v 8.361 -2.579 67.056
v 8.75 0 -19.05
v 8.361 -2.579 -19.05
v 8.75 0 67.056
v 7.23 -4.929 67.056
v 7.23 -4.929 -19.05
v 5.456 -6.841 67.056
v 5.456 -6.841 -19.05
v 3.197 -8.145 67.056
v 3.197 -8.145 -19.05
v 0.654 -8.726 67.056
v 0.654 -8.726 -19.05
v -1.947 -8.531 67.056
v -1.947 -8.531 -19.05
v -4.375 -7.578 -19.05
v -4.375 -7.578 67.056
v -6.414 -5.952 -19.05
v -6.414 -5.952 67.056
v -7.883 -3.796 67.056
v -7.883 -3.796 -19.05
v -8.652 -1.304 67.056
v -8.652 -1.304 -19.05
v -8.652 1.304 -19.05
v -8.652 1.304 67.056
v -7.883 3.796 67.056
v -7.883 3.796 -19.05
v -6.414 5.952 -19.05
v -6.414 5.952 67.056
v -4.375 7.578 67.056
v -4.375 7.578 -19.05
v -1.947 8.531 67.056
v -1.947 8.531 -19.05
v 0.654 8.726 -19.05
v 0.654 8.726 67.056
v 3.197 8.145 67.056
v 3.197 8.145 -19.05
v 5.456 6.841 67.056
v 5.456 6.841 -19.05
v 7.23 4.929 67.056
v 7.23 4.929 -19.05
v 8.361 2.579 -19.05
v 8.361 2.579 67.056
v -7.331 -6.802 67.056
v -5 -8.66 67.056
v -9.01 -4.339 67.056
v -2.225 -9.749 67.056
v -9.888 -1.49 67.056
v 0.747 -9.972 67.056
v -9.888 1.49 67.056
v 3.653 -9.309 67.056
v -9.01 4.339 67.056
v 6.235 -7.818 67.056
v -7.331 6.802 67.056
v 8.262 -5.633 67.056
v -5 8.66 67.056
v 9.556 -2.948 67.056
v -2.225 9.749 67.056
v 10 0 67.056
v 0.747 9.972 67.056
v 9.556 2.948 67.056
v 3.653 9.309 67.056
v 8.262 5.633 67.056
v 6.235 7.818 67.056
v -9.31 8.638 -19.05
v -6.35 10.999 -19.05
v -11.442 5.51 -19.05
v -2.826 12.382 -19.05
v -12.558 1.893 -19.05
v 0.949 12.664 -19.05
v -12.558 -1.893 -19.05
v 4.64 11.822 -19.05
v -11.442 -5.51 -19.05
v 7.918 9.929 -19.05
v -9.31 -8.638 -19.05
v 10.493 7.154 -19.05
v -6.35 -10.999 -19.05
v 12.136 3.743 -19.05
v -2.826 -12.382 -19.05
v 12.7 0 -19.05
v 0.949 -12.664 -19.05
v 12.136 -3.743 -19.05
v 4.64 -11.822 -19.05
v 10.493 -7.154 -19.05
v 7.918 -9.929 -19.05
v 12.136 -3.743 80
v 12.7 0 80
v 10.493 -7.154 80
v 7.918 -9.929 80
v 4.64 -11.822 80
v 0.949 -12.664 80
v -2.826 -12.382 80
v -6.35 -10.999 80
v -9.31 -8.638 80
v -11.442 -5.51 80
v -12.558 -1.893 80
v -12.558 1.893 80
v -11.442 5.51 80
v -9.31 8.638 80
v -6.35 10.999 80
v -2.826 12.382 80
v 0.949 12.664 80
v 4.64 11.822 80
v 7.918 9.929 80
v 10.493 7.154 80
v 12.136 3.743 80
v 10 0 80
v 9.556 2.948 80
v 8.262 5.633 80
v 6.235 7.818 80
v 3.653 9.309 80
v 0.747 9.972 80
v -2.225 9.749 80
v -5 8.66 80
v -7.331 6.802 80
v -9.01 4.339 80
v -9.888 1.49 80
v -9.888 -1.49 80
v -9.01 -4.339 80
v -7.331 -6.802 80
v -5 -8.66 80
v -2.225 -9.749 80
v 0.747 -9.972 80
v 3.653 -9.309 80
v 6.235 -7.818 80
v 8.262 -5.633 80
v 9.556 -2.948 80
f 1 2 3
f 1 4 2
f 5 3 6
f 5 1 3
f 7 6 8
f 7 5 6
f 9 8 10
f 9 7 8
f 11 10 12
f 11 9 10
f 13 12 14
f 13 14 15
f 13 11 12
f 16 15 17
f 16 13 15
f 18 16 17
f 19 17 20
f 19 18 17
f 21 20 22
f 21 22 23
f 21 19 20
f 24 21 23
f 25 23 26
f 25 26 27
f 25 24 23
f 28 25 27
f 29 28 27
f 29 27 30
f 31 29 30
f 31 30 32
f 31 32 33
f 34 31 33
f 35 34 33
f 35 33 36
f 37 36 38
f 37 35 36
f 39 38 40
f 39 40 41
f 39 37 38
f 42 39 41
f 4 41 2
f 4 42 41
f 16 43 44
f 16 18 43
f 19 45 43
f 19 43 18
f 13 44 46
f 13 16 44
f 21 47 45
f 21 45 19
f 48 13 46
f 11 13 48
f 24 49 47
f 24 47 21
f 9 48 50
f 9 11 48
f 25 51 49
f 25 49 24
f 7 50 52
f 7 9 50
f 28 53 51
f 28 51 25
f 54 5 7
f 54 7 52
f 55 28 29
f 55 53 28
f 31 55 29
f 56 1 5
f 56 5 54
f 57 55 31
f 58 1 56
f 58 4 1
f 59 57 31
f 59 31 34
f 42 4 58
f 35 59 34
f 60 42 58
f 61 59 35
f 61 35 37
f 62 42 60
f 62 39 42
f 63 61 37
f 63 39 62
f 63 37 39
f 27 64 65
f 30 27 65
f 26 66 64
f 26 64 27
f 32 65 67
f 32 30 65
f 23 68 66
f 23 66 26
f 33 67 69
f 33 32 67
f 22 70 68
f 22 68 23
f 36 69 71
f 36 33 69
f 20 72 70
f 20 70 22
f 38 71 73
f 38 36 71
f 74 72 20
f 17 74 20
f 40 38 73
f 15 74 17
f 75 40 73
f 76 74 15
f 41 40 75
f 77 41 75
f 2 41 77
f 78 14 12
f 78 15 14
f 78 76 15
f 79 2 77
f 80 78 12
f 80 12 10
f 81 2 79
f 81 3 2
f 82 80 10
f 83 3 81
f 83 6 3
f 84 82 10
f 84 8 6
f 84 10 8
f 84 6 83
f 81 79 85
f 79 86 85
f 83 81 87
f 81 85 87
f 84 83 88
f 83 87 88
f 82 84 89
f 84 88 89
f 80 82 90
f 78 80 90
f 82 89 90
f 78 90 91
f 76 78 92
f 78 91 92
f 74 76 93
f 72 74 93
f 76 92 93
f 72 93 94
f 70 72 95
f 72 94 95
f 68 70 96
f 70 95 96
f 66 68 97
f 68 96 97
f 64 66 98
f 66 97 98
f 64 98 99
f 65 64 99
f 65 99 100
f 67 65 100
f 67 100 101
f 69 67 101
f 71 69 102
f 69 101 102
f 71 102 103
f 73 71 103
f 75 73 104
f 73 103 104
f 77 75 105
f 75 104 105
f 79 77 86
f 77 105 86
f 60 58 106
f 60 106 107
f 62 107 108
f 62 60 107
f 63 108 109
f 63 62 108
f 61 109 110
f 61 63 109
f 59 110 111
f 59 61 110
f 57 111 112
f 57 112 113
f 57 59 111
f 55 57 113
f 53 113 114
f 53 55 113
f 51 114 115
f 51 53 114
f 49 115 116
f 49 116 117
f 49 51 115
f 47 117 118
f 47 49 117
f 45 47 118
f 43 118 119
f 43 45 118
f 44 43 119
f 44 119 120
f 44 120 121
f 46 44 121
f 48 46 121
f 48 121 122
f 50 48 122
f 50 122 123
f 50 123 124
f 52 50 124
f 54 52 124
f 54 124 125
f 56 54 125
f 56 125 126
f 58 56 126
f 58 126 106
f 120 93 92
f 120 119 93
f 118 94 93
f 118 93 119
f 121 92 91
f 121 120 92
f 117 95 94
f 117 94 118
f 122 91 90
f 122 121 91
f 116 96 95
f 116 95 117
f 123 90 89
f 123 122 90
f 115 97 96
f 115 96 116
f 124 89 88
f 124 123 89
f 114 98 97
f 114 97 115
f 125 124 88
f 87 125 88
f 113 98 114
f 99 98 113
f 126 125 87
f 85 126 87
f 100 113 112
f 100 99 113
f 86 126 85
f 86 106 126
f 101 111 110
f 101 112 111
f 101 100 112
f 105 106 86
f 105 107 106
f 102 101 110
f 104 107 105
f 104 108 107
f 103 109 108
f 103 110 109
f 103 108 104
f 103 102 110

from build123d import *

# Parameters (mm, degrees)
F0_R        = 12.7
F0_R_2      = 10
F1_DEPTH    = 80
F2_R        = 10
F2_R_2      = 8.75
F3_DEPTH    = 67.056
F3_FACE_R   = 12.7
F3_FACE_R_2 = 8.75
F4_DEPTH    = 19.05


with BuildPart() as f1:
    # F0 (on Top) → F1 (new body)
    with BuildSketch(Plane.XY):
        Circle(F0_R)
        Circle(F0_R_2, mode=Mode.SUBTRACT)
    extrude(amount=F1_DEPTH)

    # F2 (on Top) → F3 (join)
    with BuildSketch(Plane.XY):
        Circle(F2_R)
        Circle(F2_R_2, mode=Mode.SUBTRACT)
    extrude(amount=F3_DEPTH)

    # F3_face (on face) → F4 (join)
    with BuildSketch(Plane(origin=(0, 0, 0), x_dir=(1, 0, 0), z_dir=(0, 0, -1))):
        Circle(F3_FACE_R)
        Circle(F3_FACE_R_2, mode=Mode.SUBTRACT)
    extrude(amount=F4_DEPTH)


solid = f1.part
